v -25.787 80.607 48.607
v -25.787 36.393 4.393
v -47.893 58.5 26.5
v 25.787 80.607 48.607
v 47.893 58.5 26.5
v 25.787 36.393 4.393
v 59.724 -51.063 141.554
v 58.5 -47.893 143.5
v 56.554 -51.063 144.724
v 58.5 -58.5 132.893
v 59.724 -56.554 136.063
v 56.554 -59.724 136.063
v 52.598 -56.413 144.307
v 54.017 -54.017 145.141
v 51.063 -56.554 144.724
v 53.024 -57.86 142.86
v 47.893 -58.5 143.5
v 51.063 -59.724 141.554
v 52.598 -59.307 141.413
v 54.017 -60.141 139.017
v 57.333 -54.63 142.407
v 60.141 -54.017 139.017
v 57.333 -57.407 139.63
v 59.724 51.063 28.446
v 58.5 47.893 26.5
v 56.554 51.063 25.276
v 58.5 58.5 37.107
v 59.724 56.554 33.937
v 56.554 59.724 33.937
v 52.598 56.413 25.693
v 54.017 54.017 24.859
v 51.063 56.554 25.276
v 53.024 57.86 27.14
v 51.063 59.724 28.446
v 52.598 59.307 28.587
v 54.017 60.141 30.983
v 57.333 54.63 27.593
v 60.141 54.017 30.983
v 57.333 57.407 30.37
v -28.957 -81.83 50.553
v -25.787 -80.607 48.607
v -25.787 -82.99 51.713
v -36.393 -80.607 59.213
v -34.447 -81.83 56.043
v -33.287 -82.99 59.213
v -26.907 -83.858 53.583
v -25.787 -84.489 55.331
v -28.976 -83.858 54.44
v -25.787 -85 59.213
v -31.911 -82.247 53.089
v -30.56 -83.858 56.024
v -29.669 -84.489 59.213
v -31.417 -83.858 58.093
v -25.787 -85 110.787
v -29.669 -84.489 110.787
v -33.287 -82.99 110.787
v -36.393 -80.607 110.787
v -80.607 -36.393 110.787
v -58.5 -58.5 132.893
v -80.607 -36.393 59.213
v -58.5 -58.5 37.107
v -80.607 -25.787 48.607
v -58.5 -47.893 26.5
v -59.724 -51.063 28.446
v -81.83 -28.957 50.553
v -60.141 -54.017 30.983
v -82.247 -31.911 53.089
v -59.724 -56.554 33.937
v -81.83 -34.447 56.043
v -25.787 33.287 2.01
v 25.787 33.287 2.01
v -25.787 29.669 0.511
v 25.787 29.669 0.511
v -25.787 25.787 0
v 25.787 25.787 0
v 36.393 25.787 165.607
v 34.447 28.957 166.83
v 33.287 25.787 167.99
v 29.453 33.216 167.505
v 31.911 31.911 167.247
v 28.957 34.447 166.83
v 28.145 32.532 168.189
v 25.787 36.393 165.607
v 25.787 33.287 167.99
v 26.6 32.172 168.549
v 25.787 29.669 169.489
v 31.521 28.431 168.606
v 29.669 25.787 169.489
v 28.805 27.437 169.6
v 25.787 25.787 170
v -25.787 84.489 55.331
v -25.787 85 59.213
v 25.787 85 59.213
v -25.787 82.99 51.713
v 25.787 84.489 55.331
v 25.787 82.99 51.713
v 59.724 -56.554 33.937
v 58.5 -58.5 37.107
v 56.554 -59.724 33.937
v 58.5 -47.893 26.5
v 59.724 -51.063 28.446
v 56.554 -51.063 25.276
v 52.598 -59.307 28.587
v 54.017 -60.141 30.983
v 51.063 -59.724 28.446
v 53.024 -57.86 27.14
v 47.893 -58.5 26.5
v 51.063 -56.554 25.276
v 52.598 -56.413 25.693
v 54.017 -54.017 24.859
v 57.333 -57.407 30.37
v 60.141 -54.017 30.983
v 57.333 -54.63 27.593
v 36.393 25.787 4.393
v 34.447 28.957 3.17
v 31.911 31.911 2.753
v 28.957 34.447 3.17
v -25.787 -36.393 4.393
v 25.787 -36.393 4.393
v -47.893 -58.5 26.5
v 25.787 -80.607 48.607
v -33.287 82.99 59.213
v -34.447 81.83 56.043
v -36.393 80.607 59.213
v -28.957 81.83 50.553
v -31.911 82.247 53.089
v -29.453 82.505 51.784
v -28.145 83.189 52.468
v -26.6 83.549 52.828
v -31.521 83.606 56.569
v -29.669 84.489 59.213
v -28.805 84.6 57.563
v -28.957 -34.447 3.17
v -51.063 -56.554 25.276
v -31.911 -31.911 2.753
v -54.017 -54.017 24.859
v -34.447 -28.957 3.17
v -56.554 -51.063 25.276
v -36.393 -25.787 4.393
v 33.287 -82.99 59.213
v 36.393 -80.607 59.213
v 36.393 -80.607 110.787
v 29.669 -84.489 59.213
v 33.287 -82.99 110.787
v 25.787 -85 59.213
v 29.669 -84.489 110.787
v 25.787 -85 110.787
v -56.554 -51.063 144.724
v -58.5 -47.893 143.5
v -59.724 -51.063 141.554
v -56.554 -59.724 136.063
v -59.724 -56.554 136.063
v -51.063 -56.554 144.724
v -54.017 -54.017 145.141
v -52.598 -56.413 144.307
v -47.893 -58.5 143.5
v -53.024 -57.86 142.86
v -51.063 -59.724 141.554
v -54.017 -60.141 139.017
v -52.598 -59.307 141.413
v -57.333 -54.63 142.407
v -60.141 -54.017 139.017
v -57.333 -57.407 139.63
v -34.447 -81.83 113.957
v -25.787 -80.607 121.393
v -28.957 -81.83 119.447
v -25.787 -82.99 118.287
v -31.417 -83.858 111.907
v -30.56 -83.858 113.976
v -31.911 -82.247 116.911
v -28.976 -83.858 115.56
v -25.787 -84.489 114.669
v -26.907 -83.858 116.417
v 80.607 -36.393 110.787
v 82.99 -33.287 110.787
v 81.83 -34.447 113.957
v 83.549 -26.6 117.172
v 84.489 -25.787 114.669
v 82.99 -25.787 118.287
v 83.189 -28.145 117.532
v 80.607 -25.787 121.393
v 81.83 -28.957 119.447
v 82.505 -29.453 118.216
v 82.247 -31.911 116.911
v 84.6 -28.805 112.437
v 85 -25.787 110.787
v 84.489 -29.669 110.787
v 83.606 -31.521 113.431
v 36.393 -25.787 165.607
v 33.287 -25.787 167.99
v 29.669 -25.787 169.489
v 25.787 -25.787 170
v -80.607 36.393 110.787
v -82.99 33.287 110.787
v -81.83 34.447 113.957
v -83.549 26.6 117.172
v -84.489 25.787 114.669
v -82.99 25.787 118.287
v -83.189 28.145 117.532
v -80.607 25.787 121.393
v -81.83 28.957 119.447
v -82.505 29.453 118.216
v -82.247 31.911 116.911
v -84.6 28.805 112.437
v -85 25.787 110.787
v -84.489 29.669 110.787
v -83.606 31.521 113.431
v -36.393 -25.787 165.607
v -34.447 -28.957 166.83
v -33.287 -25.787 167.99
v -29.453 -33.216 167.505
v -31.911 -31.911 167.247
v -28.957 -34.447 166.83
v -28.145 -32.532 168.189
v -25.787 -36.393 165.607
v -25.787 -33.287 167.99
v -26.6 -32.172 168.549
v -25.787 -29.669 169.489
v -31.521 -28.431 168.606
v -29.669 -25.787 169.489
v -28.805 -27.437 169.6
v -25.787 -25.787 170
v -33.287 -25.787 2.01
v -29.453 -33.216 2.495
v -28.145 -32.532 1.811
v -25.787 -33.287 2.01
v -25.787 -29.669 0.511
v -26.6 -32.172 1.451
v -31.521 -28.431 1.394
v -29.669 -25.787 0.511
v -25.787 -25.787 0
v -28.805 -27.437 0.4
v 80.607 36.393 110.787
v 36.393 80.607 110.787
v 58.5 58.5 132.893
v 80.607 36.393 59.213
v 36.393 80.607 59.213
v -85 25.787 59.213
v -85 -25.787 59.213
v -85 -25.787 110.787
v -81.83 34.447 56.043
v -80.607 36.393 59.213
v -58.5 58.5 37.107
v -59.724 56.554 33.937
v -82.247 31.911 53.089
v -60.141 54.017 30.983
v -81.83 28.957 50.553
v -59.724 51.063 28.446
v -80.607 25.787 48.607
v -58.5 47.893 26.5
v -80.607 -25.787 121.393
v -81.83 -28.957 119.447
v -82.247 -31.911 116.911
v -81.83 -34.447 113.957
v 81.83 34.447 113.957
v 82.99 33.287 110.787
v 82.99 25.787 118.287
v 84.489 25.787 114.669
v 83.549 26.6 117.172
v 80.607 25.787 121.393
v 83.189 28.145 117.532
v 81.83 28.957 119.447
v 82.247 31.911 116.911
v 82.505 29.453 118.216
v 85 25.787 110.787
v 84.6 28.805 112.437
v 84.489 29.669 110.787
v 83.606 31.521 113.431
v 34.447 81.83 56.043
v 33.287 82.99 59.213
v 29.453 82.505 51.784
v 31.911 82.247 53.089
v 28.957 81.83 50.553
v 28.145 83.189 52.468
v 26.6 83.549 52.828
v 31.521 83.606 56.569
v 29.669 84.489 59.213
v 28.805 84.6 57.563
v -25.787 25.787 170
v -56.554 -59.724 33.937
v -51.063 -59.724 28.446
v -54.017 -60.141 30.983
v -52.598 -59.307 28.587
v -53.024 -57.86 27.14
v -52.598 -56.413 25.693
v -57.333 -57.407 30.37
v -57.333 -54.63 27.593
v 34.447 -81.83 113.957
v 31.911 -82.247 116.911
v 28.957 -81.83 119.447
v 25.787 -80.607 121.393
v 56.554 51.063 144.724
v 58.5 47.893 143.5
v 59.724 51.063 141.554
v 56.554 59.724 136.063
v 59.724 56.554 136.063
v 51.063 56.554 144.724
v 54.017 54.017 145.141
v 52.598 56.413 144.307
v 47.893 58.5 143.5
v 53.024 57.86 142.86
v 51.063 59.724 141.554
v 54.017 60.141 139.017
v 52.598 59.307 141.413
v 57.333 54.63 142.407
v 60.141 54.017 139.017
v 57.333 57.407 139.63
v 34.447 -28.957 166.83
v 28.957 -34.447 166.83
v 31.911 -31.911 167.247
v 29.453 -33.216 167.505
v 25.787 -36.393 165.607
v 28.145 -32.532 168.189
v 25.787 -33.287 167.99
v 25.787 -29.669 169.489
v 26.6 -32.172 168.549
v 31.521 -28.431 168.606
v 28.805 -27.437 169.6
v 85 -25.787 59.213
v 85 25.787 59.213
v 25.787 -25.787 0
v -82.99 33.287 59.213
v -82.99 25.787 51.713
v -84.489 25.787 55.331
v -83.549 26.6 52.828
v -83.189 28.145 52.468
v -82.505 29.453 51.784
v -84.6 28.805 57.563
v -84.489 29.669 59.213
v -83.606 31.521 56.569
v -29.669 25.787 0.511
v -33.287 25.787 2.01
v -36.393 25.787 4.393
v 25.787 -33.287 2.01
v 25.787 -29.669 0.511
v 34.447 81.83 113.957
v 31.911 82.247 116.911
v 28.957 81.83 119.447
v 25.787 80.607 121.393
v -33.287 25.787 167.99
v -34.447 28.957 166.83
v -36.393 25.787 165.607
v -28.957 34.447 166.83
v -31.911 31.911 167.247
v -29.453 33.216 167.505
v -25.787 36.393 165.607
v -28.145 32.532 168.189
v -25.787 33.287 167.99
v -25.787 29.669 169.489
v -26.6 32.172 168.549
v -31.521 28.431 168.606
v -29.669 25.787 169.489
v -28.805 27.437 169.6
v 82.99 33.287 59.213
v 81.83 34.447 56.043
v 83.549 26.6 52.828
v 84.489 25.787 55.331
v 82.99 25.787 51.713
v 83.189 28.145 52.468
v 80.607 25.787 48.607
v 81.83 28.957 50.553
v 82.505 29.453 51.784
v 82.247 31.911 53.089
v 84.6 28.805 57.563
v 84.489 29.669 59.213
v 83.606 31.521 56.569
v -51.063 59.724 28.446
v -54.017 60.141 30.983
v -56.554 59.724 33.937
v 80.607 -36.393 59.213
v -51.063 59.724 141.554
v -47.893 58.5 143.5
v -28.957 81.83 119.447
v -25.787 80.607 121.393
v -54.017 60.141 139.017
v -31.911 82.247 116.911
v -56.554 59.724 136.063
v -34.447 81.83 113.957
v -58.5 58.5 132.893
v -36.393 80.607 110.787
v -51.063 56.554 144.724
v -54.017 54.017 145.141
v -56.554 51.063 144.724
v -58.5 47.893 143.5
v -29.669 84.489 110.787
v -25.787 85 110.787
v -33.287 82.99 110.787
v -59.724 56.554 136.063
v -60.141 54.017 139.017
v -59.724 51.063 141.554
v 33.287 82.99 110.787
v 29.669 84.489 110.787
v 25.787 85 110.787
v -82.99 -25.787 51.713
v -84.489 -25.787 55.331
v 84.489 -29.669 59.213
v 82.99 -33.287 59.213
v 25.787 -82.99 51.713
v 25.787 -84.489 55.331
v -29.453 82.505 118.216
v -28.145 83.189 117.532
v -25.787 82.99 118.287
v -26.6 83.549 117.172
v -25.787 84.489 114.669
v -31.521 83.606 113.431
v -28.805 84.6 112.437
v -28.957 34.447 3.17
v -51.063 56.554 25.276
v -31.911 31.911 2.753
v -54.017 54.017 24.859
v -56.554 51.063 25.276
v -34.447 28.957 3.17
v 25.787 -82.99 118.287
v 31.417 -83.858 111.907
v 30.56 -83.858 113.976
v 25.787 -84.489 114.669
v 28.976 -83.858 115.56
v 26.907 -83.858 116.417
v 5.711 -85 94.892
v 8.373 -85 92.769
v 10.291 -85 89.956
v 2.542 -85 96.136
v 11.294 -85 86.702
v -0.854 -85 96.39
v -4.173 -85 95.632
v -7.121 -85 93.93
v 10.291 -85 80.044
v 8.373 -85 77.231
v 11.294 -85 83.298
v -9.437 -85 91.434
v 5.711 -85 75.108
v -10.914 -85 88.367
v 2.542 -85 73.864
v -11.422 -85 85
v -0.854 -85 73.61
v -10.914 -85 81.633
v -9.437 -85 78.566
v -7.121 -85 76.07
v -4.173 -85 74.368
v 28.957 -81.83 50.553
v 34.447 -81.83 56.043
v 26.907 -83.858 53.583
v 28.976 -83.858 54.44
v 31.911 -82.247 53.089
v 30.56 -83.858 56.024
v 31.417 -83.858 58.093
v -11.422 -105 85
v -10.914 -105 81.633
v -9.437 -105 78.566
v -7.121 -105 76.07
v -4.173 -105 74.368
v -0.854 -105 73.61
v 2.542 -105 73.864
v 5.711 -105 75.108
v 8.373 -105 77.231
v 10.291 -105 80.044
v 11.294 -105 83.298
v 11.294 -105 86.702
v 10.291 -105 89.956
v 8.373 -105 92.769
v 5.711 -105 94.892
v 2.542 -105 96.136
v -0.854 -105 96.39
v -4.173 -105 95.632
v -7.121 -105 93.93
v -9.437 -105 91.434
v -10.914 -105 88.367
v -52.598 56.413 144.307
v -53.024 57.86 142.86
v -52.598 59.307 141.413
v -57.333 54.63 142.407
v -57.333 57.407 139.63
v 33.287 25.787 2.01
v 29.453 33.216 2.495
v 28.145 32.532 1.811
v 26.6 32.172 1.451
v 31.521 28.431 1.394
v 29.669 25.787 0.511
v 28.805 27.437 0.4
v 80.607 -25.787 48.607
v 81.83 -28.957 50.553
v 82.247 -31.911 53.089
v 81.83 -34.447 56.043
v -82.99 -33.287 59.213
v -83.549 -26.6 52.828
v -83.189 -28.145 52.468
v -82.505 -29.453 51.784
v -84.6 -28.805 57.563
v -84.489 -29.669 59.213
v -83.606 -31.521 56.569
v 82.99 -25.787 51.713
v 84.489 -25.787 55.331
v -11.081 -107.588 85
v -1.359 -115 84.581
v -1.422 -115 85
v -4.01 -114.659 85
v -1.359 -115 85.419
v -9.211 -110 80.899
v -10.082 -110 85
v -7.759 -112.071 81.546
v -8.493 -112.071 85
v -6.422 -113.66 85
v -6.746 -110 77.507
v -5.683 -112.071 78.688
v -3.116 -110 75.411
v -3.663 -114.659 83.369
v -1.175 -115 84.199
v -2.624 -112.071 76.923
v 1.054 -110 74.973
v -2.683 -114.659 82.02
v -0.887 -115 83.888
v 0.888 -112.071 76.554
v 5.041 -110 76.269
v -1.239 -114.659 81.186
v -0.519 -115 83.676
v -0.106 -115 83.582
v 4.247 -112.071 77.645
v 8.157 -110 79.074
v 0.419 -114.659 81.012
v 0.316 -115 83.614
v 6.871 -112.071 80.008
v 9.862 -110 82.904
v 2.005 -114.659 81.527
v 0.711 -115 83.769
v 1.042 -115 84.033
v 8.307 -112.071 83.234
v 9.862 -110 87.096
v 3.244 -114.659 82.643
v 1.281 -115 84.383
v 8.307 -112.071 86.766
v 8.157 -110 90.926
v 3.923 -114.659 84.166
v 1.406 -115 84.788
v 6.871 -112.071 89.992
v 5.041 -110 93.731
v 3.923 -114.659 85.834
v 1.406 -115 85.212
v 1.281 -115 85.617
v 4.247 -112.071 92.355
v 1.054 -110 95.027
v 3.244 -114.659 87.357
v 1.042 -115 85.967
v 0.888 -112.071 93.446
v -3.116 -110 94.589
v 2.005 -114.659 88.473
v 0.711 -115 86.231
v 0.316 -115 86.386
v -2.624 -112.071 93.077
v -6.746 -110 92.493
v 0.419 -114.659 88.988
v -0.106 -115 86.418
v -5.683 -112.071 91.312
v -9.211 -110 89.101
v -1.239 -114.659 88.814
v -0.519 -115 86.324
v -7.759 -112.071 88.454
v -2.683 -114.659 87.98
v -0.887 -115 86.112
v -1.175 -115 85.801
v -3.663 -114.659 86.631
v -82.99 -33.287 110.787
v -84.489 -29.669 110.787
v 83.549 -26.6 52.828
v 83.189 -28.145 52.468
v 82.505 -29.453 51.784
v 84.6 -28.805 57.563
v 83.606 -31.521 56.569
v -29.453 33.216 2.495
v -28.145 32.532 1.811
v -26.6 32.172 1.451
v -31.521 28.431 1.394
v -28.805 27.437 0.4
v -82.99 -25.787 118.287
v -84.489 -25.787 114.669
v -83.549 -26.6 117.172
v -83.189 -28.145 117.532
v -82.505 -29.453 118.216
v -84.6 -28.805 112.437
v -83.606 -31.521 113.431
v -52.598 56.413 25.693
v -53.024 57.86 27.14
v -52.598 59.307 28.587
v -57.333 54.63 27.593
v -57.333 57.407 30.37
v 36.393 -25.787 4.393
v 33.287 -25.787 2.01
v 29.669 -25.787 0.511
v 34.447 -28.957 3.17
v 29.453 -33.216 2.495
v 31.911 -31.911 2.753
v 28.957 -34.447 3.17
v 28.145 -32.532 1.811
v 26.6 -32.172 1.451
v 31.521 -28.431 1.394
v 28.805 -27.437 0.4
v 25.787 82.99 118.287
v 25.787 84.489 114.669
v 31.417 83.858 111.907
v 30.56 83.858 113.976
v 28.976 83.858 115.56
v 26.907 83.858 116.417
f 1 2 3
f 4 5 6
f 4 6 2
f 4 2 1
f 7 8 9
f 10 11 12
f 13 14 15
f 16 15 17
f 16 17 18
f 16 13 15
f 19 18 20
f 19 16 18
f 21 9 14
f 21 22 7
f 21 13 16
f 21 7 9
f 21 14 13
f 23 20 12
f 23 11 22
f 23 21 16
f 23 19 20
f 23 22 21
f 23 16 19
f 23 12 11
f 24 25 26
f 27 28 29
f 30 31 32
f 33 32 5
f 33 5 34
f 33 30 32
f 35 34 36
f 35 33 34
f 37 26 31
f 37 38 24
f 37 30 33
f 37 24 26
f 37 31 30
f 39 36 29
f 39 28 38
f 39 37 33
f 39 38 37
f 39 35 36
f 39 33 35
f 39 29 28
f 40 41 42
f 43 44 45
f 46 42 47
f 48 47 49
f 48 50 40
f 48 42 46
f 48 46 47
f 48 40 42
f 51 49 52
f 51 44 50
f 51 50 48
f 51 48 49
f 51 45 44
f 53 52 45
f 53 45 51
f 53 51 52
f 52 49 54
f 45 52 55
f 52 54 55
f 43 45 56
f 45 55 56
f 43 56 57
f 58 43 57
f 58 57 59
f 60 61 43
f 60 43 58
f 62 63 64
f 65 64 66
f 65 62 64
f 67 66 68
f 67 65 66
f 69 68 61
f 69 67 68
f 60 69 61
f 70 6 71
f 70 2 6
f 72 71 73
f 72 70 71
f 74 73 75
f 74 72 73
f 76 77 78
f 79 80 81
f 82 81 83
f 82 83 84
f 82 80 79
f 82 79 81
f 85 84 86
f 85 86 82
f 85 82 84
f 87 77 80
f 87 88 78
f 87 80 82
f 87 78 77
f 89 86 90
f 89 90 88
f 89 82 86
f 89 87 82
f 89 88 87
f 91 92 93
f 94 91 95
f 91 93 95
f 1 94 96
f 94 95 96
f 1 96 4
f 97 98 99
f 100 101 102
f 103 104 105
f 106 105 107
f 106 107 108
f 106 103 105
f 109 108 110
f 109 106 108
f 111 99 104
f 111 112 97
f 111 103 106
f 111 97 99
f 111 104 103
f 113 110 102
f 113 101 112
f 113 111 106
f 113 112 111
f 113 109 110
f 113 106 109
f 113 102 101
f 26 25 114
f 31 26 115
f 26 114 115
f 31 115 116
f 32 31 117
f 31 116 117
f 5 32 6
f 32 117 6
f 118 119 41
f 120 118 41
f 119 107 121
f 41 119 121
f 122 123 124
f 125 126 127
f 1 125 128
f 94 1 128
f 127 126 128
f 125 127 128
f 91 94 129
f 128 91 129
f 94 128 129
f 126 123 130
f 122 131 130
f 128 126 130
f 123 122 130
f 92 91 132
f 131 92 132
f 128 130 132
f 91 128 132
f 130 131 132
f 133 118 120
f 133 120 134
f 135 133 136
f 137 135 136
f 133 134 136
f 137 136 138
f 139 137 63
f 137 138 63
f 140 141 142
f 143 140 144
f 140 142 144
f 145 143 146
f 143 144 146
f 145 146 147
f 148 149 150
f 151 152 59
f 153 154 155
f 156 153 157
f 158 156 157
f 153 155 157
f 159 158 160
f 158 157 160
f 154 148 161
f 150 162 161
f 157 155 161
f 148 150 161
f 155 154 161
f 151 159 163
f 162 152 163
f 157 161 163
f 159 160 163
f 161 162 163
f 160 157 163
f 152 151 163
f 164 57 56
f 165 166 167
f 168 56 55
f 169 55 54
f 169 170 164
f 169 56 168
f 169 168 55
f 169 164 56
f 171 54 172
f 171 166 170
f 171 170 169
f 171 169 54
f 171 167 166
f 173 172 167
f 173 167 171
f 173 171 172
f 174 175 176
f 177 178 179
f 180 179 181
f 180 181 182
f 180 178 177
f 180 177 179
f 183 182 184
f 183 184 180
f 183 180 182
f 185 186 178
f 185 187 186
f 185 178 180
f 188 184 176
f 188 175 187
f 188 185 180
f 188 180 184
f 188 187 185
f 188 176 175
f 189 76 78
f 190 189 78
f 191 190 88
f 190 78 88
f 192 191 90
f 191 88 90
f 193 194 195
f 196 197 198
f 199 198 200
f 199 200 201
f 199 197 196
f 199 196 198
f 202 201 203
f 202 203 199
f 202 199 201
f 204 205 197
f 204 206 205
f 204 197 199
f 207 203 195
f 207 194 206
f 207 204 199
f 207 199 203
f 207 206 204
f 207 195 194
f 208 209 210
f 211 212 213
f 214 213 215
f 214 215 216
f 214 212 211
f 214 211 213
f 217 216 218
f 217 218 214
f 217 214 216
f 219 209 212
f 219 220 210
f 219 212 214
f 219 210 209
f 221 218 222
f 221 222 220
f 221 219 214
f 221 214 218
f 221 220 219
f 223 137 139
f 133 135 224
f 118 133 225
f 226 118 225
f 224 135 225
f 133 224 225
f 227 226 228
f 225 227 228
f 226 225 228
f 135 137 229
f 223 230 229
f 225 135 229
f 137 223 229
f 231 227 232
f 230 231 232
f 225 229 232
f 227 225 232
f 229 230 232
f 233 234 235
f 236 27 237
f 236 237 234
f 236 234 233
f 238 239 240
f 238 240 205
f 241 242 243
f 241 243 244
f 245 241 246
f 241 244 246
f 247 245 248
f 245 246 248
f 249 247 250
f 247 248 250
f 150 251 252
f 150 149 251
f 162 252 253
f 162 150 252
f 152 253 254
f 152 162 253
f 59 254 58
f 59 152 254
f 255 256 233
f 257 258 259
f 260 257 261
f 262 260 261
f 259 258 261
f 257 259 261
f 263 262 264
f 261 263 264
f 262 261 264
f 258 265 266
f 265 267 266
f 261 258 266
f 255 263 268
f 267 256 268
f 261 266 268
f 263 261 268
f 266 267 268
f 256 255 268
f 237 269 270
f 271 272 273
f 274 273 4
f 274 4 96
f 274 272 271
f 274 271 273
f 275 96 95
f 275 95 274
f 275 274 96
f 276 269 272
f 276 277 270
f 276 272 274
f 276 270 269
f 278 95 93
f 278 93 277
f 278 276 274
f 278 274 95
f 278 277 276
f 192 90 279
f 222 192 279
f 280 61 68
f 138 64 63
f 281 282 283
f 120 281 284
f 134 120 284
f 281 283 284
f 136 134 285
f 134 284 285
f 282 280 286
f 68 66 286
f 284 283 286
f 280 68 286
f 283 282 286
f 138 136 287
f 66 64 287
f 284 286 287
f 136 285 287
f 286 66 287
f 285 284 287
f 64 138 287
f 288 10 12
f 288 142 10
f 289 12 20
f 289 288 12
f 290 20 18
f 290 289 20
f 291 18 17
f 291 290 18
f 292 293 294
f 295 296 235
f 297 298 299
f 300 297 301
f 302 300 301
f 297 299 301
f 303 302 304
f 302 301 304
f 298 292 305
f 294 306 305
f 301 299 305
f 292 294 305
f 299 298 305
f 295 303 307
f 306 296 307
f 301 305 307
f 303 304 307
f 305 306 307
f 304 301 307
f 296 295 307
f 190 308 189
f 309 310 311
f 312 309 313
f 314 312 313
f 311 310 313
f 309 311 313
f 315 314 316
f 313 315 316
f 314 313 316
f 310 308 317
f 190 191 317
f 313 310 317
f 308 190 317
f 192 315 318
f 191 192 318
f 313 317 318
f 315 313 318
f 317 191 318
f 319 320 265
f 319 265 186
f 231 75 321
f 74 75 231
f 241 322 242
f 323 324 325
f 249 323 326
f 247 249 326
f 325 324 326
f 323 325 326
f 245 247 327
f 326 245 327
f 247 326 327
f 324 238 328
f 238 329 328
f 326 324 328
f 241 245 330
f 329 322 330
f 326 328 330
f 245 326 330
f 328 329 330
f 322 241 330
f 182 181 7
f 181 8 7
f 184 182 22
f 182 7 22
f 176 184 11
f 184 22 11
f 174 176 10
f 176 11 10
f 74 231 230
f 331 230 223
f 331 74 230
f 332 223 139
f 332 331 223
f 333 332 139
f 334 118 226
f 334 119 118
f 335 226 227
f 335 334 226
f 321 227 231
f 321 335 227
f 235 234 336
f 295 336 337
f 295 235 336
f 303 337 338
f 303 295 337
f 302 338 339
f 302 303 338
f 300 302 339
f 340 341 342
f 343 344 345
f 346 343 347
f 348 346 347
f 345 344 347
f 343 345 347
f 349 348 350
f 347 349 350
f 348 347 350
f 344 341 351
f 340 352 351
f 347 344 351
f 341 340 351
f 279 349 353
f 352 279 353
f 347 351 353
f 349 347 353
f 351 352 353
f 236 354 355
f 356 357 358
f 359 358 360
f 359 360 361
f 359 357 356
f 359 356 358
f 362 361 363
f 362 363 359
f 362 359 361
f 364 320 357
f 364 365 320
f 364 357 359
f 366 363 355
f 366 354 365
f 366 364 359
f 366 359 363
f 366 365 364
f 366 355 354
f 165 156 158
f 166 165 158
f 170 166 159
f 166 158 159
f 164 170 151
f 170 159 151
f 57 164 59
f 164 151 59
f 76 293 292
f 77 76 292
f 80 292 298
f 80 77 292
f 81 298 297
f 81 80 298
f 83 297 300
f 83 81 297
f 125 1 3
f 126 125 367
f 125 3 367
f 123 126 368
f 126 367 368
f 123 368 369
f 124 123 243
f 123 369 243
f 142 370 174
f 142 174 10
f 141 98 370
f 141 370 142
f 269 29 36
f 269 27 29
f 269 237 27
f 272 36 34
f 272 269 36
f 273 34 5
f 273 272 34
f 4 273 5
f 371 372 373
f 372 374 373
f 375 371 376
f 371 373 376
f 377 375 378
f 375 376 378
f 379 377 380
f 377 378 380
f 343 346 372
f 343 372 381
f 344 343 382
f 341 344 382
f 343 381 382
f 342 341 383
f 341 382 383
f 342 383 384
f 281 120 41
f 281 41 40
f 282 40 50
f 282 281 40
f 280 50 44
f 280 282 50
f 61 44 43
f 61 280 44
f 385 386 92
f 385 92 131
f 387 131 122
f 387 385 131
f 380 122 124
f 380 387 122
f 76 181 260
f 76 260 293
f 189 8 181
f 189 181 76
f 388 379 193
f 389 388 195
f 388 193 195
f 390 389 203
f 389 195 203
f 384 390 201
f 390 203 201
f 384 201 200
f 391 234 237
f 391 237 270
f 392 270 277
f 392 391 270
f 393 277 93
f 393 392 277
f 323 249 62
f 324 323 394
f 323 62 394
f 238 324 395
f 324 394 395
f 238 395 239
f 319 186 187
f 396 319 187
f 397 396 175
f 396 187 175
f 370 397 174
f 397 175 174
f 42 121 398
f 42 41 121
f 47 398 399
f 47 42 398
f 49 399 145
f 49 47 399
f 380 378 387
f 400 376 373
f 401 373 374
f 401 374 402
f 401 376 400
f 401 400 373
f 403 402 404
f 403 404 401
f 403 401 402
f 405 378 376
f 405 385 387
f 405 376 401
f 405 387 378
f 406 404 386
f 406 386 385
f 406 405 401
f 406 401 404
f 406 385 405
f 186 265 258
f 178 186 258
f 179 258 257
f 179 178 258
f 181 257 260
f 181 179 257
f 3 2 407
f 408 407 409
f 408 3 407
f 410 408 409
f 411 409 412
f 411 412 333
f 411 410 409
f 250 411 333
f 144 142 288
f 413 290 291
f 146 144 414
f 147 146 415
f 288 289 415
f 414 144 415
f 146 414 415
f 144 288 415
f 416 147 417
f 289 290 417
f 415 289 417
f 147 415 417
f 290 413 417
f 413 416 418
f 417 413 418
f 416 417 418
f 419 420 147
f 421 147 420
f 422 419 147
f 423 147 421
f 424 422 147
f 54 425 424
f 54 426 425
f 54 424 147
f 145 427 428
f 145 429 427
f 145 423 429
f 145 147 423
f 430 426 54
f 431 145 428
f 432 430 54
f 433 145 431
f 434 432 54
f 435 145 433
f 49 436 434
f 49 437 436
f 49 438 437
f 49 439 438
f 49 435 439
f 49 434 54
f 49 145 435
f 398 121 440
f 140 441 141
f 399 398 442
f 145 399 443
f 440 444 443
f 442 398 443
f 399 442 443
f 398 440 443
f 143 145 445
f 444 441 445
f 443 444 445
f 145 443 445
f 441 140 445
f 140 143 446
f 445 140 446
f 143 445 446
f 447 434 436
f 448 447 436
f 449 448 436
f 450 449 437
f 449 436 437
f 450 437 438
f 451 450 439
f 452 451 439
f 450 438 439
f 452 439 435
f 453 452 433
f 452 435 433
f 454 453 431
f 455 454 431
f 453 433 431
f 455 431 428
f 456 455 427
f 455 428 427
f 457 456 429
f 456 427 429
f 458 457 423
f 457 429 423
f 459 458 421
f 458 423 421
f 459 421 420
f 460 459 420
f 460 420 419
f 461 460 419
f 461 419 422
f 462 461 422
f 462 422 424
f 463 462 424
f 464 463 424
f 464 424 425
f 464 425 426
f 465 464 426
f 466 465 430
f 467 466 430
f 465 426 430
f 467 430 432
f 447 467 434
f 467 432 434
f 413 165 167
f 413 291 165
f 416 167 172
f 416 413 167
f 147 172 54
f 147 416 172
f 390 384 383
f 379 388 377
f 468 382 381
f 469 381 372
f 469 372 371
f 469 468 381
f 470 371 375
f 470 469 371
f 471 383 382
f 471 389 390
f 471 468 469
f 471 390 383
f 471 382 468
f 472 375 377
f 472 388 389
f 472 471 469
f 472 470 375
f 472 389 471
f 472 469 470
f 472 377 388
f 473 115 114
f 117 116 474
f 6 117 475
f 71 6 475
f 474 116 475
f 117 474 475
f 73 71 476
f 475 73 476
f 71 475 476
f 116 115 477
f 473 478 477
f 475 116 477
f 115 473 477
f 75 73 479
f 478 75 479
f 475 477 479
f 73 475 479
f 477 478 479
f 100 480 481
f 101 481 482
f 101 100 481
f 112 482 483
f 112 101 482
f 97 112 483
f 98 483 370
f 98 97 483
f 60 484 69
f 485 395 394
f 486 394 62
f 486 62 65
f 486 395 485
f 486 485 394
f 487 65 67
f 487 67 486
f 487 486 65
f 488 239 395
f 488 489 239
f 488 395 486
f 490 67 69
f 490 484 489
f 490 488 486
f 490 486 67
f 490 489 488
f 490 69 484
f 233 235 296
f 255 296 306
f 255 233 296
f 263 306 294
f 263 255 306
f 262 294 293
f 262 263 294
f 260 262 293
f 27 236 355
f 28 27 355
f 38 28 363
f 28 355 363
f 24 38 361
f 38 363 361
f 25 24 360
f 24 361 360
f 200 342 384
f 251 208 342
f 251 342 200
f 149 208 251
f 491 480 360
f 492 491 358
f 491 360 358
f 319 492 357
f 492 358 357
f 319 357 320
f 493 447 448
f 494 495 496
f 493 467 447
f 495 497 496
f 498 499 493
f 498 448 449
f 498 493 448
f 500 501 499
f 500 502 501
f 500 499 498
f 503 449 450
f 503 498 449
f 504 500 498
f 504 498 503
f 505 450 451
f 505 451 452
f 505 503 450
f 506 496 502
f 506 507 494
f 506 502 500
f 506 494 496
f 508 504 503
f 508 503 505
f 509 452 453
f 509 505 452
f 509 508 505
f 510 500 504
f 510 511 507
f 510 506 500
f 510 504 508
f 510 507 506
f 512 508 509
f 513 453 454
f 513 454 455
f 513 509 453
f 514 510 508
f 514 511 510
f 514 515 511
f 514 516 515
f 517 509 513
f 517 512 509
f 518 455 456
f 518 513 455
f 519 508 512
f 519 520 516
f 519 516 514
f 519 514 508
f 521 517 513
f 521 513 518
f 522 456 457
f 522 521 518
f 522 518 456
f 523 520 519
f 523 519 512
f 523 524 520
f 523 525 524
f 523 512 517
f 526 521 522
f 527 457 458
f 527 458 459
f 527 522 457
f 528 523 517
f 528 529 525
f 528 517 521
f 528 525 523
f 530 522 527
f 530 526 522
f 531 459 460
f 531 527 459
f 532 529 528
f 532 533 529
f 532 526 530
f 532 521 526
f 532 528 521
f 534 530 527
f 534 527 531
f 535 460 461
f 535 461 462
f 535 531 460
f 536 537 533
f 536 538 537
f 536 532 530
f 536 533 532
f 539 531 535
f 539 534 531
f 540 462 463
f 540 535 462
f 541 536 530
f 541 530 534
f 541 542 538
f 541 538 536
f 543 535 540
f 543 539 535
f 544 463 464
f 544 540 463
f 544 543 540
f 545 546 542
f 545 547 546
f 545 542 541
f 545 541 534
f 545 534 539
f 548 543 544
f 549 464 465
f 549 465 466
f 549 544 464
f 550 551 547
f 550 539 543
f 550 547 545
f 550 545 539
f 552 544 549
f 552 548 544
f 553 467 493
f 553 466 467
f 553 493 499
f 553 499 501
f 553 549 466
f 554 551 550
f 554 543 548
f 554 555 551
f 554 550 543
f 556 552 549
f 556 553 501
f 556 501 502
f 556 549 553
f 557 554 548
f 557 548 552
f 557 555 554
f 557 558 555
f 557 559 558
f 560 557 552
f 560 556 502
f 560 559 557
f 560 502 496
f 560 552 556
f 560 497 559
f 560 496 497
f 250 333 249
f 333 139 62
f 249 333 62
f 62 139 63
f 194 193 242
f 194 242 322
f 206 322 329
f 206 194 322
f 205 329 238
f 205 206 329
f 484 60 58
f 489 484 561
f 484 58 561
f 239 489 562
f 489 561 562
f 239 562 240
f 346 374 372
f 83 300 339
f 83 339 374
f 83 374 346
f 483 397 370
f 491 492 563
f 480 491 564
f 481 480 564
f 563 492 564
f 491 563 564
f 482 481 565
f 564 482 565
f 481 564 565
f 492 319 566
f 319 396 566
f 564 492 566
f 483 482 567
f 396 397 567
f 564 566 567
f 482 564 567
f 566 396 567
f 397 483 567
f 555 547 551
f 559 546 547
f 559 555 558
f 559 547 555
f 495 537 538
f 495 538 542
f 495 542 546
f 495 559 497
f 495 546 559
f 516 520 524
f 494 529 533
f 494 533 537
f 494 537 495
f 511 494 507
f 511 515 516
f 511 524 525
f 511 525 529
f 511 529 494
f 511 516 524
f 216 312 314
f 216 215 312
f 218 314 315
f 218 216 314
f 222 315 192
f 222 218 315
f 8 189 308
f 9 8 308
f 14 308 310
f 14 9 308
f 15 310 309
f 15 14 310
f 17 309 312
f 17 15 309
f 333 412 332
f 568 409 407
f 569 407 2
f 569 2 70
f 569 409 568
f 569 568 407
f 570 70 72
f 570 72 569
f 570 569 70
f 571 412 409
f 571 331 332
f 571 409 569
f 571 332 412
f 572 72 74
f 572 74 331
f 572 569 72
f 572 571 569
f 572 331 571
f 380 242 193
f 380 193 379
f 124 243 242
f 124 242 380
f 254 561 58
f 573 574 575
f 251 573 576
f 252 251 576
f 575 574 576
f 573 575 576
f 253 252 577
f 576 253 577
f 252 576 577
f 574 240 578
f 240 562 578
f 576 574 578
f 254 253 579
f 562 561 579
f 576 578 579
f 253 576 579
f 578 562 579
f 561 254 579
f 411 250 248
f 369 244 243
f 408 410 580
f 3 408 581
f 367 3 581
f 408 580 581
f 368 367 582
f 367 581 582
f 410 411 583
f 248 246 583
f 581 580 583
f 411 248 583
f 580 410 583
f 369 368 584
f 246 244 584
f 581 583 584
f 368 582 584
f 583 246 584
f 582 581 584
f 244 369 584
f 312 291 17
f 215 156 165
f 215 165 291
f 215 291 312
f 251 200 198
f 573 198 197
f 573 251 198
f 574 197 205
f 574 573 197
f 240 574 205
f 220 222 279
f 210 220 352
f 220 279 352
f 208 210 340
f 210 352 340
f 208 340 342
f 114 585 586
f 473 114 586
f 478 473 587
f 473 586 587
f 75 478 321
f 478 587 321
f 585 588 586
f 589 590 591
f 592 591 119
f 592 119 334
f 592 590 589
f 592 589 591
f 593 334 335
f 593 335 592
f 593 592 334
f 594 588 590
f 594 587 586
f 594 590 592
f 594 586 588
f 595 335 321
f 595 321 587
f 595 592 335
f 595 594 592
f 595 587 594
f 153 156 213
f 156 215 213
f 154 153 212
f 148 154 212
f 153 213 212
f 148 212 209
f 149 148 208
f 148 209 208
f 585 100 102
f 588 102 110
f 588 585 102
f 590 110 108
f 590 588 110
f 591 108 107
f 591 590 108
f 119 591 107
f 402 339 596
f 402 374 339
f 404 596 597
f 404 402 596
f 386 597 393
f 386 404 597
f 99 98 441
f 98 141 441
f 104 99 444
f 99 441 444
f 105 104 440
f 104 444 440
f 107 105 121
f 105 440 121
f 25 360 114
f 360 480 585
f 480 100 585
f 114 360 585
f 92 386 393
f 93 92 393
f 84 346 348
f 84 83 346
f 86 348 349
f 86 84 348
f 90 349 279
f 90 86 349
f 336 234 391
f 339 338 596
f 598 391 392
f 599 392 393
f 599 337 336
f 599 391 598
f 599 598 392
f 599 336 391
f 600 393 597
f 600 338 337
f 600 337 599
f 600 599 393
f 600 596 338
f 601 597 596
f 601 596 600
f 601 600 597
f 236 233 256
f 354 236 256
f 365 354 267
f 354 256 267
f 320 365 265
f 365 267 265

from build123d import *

# Parameters (mm, degrees)
BOSS_EXTRU_1_DEPTH            = 170
ENL_V_MAT_EXTRU_1_DEPTH       = 220
ENL_V_MAT_EXTRU_2_DEPTH       = 220
ENL_V_MAT_EXTRU_3_DEPTH       = 220
ENL_V_MAT_EXTRU_4_DEPTH       = 220
ENL_V_MAT_EXTRU_11_DEPTH      = 220
ENL_V_MAT_EXTRU_13_DEPTH      = 220
ENL_V_MAT_EXTRU_13_DEPTH_BACK = 220
ENL_V_MAT_EXTRU_14_DEPTH      = 220
ENL_V_MAT_EXTRU_15_DEPTH      = 220
ENL_V_MAT_EXTRU_15_DEPTH_BACK = 220
ENL_V_MAT_EXTRU_16_DEPTH      = 220
ENL_V_MAT_EXTRU_17_DEPTH      = 220
ENL_V_MAT_EXTRU_17_DEPTH_BACK = 220
ENL_V_MAT_EXTRU_18_DEPTH      = 220
ENL_V_MAT_EXTRU_19_DEPTH      = 220
ENL_V_MAT_EXTRU_19_DEPTH_BACK = 220
ENL_V_MAT_EXTRU_20_DEPTH      = 220
ENL_V_MAT_EXTRU_20_DEPTH_BACK = 220
ENL_V_MAT_EXTRU_21_DEPTH      = 220
ENL_V_MAT_EXTRU_21_DEPTH_BACK = 220
ENL_V_MAT_EXTRU_22_DEPTH      = 220
ENL_V_MAT_EXTRU_22_DEPTH_BACK = 220
ENL_V_MAT_EXTRU_23_DEPTH      = 220
ENL_V_MAT_EXTRU_23_DEPTH_BACK = 220
CONG_2_R                      = 15
ESQUISSE26_R                  = 11.42194069
BOSS_EXTRU_2_DEPTH            = 30
CONG_6_R                      = 10


with BuildPart() as part:
    # Esquisse1 → Boss.-Extru.1 (new body)
    with BuildSketch(Plane.XY):
        Polygon((-32, 85), (32, 85), (85, 32), (85, -32), (32, -85), (-32, -85), (-85, -32), (-85, 32), align=None)
    extrude(amount=BOSS_EXTRU_1_DEPTH)

    # Esquisse3D3 → Enlèv. mat.-Extru.1 (cut, along a direction that is not the sketch's normal)
    with BuildSketch(Plane(origin=(-32, 85, 117), x_dir=(0.6493531093113899, -0.5377455436484948, 0.5377455436484945), z_dir=(0, 0.7071067811865474, 0.7071067811865478))):
        Polygon((0, 0), (57.001027627, -48.67117062), (98.559626623, 0), (41.558598996, 48.67117062), align=None)
    extrude(amount=ENL_V_MAT_EXTRU_1_DEPTH, dir=(0, 0, 1), mode=Mode.SUBTRACT)

    # Esquisse3D4 → Enlèv. mat.-Extru.2 (cut, along a direction that is not the sketch's normal)
    with BuildSketch(Plane(origin=(32, 85, 53), x_dir=(-0.6493531093113893, -0.537745543648495, -0.537745543648495), z_dir=(0, -0.7071067811865476, 0.7071067811865476))):
        Polygon((0, 0), (57.001027627, 48.67117062), (98.559626623, 0), (41.558598996, -48.67117062), align=None)
    extrude(amount=-ENL_V_MAT_EXTRU_2_DEPTH, dir=(0, 0, 1), mode=Mode.SUBTRACT)

    # Esquisse3D5 → Enlèv. mat.-Extru.3 (cut, along a direction that is not the sketch's normal)
    with BuildSketch(Plane(origin=(-32, -85, 53), x_dir=(0.6493531093113899, 0.5377455436484946, -0.5377455436484948), z_dir=(0, 0.7071067811865479, 0.7071067811865472))):
        Polygon((0, 0), (57.001027627, 48.67117062), (98.559626623, 0), (41.558598996, -48.67117062), align=None)
    extrude(amount=-ENL_V_MAT_EXTRU_3_DEPTH, dir=(0, 0, 1), mode=Mode.SUBTRACT)

    # Esquisse3D6 → Enlèv. mat.-Extru.4 (cut, along a direction that is not the sketch's normal)
    with BuildSketch(Plane(origin=(32, -85, 117), x_dir=(-0.6493531093113899, 0.5377455436484946, 0.5377455436484947), z_dir=(0, 0.7071067811865476, -0.7071067811865476))):
        Polygon((0, 0), (57.001027627, 48.67117062), (98.559626623, 0), (41.558598996, -48.67117062), align=None)
    extrude(amount=-ENL_V_MAT_EXTRU_4_DEPTH, dir=(0, 0, -1), mode=Mode.SUBTRACT)

    # Esquisse3D13 → Enlèv. mat.-Extru.11 (cut, along a direction that is not the sketch's normal)
    with BuildSketch(Plane(origin=(32, 32, 170), x_dir=(0.5377455436484943, -0.6493531093113897, -0.5377455436484953), z_dir=(-0.7071067811865481, 0, -0.7071067811865469))):
        Polygon((0, 0), (57.001027627, -48.67117062), (98.559626623, 0), (41.558598996, 48.67117062), align=None)
    extrude(amount=-ENL_V_MAT_EXTRU_11_DEPTH, dir=(-1, 0, 0), mode=Mode.SUBTRACT)

    # Esquisse16 → Enlèv. mat.-Extru.13 (cut, two sides: drawn at the far end of the back side and taken through both)
    with BuildSketch(Plane(origin=(0, -32, 0), x_dir=(1, 0, 0), z_dir=(0, 1, 0)).offset(-ENL_V_MAT_EXTRU_13_DEPTH_BACK)):
        Polygon((32, -170), (85, -170), (85, -117), align=None)
    extrude(amount=ENL_V_MAT_EXTRU_13_DEPTH + ENL_V_MAT_EXTRU_13_DEPTH_BACK, mode=Mode.SUBTRACT)

    # Esquisse3D15 → Enlèv. mat.-Extru.14 (cut, along a direction that is not the sketch's normal)
    with BuildSketch(Plane(origin=(-85, -32, 117), x_dir=(0.5377455436484945, 0.6493531093113897, 0.5377455436484953), z_dir=(0.707106781186548, 0, -0.707106781186547))):
        Polygon((0, 0), (57.001027627, 48.67117062), (98.559626623, 0), (41.558598996, -48.67117062), align=None)
    extrude(amount=-ENL_V_MAT_EXTRU_14_DEPTH, dir=(0, 0, -1), mode=Mode.SUBTRACT)

    # Esquisse17 → Enlèv. mat.-Extru.15 (cut, two sides: drawn at the far end of the back side and taken through both)
    with BuildSketch(Plane(origin=(0, -32, 0), x_dir=(1, 0, 0), z_dir=(0, 1, 0)).offset(-ENL_V_MAT_EXTRU_15_DEPTH_BACK)):
        Polygon((-85, -117), (-32, -170), (-85, -170), align=None)
    extrude(amount=ENL_V_MAT_EXTRU_15_DEPTH + ENL_V_MAT_EXTRU_15_DEPTH_BACK, mode=Mode.SUBTRACT)

    # Esquisse3D16 → Enlèv. mat.-Extru.16 (cut, along a direction that is not the sketch's normal)
    with BuildSketch(Plane(origin=(-32, 32, 0), x_dir=(-0.5377455436484945, -0.6493531093113896, 0.5377455436484951), z_dir=(0.7071067811865479, 0, 0.7071067811865471))):
        Polygon((0, 0), (57.001027627, -48.67117062), (98.559626623, 0), (41.558598996, 48.67117062), align=None)
    extrude(amount=-ENL_V_MAT_EXTRU_16_DEPTH, dir=(0, 0, 1), mode=Mode.SUBTRACT)

    # Esquisse18 → Enlèv. mat.-Extru.17 (cut, two sides: drawn at the far end of the back side and taken through both)
    with BuildSketch(Plane(origin=(0, -32, 0), x_dir=(1, 0, 0), z_dir=(0, 1, 0)).offset(-ENL_V_MAT_EXTRU_17_DEPTH_BACK)):
        Polygon((-32, 0), (-85, -53), (-85, 0), align=None)
    extrude(amount=ENL_V_MAT_EXTRU_17_DEPTH + ENL_V_MAT_EXTRU_17_DEPTH_BACK, mode=Mode.SUBTRACT)

    # Esquisse3D17 → Enlèv. mat.-Extru.18 (cut, along a direction that is not the sketch's normal)
    with BuildSketch(Plane(origin=(85, 32, 53), x_dir=(-0.5377455436484941, -0.6493531093113903, -0.5377455436484949), z_dir=(0.707106781186548, 0, -0.707106781186547))):
        Polygon((0, 0), (57.001027627, 48.67117062), (98.559626623, 0), (41.558598996, -48.67117062), align=None)
    extrude(amount=ENL_V_MAT_EXTRU_18_DEPTH, dir=(0, 0, -1), mode=Mode.SUBTRACT)

    # Esquisse19 → Enlèv. mat.-Extru.19 (cut, two sides: drawn at the far end of the back side and taken through both)
    with BuildSketch(Plane(origin=(0, -32, 0), x_dir=(1, 0, 0), z_dir=(0, 1, 0)).offset(-ENL_V_MAT_EXTRU_19_DEPTH_BACK)):
        Polygon((85, -53), (32, 0), (85, 0), align=None)
    extrude(amount=ENL_V_MAT_EXTRU_19_DEPTH + ENL_V_MAT_EXTRU_19_DEPTH_BACK, mode=Mode.SUBTRACT)

    # Esquisse21 → Enlèv. mat.-Extru.20 (cut, two sides: drawn at the far end of the back side and taken through both)
    with BuildSketch(Plane.ZY.offset(-32).offset(-ENL_V_MAT_EXTRU_20_DEPTH_BACK)):
        Polygon((117, 85), (170, 32), (170, 85), align=None)
    extrude(amount=ENL_V_MAT_EXTRU_20_DEPTH + ENL_V_MAT_EXTRU_20_DEPTH_BACK, mode=Mode.SUBTRACT)

    # Esquisse23 → Enlèv. mat.-Extru.21 (cut, two sides: drawn at the far end of the back side and taken through both)
    with BuildSketch(Plane.ZY.offset(-32).offset(-ENL_V_MAT_EXTRU_21_DEPTH_BACK)):
        Polygon((0, 32), (53, 85), (0, 85), align=None)
    extrude(amount=ENL_V_MAT_EXTRU_21_DEPTH + ENL_V_MAT_EXTRU_21_DEPTH_BACK, mode=Mode.SUBTRACT)

    # Esquisse24 → Enlèv. mat.-Extru.22 (cut, two sides: drawn at the far end of the back side and taken through both)
    with BuildSketch(Plane.ZY.offset(-32).offset(-ENL_V_MAT_EXTRU_22_DEPTH_BACK)):
        Polygon((0, -32), (53, -85), (0, -85), align=None)
    extrude(amount=ENL_V_MAT_EXTRU_22_DEPTH + ENL_V_MAT_EXTRU_22_DEPTH_BACK, mode=Mode.SUBTRACT)

    # Esquisse25 → Enlèv. mat.-Extru.23 (cut, two sides: drawn at the far end of the back side and taken through both)
    with BuildSketch(Plane(origin=(-32, 0, 0), x_dir=(0, 0, -1), z_dir=(1, 0, 0)).offset(-ENL_V_MAT_EXTRU_23_DEPTH_BACK)):
        Polygon((-170, -32), (-170, -85), (-117, -85), align=None)
    extrude(amount=ENL_V_MAT_EXTRU_23_DEPTH + ENL_V_MAT_EXTRU_23_DEPTH_BACK, mode=Mode.SUBTRACT)

    # Congé2
    cong_2_edges = [part.edges().sort_by_distance(p)[0] for p in [
        (85, 32, 85),
        (85, -32, 85),
        (32, 0, 170),
        (85, 0, 117),
        (71.75, 45.25, 130.25),
        (-85, -32, 85),
        (-85, 32, 85),
        (-32, 0, 170),
        (-85, 0, 117),
        (-71.75, -45.25, 130.25),
        (-32, 0, 0),
        (-85, 0, 53),
        (-71.75, 45.25, 39.75),
        (85, 0, 53),
        (32, 0, 0),
        (71.75, -45.25, 39.75),
        (-71.75, 45.25, 130.25),
        (-45.25, 45.25, 156.75),
        (-32, 85, 85),
        (45.25, 45.25, 156.75),
        (45.25, 71.75, 130.25),
        (-45.25, 71.75, 130.25),
        (32, 85, 85),
        (71.75, 45.25, 39.75),
        (45.25, 45.25, 13.25),
        (-45.25, 45.25, 13.25),
        (-45.25, 71.75, 39.75),
        (45.25, 71.75, 39.75),
        (-71.75, -45.25, 39.75),
        (0, 32, 170),
        (-45.25, -71.75, 39.75),
        (-45.25, -45.25, 13.25),
        (45.25, -71.75, 39.75),
        (45.25, -45.25, 13.25),
        (0, 85, 117),
        (71.75, -45.25, 130.25),
        (-45.25, -45.25, 156.75),
        (-45.25, -71.75, 130.25),
        (45.25, -45.25, 156.75),
        (45.25, -71.75, 130.25),
        (0, 85, 53),
        (0, 32, 0),
        (0, -85, 53),
        (0, -32, 0),
        (32, -85, 85),
        (-32, -85, 85),
        (0, -32, 170),
        (0, -85, 117),
    ]]
    fillet(cong_2_edges, radius=CONG_2_R)

    # Esquisse26 → Boss.-Extru.2 (add)
    with BuildSketch(Plane.XZ.offset(85)):
        with Locations(Location((0, 85, 0), (0, 0, 180))):
            Circle(ESQUISSE26_R)
    extrude(amount=BOSS_EXTRU_2_DEPTH)

    # Congé6
    cong_6_edges = [part.edges().sort_by_distance(p)[0] for p in [
        (11.42194069, -115, 85),
    ]]
    fillet(cong_6_edges, radius=CONG_6_R)


solid = part.part
